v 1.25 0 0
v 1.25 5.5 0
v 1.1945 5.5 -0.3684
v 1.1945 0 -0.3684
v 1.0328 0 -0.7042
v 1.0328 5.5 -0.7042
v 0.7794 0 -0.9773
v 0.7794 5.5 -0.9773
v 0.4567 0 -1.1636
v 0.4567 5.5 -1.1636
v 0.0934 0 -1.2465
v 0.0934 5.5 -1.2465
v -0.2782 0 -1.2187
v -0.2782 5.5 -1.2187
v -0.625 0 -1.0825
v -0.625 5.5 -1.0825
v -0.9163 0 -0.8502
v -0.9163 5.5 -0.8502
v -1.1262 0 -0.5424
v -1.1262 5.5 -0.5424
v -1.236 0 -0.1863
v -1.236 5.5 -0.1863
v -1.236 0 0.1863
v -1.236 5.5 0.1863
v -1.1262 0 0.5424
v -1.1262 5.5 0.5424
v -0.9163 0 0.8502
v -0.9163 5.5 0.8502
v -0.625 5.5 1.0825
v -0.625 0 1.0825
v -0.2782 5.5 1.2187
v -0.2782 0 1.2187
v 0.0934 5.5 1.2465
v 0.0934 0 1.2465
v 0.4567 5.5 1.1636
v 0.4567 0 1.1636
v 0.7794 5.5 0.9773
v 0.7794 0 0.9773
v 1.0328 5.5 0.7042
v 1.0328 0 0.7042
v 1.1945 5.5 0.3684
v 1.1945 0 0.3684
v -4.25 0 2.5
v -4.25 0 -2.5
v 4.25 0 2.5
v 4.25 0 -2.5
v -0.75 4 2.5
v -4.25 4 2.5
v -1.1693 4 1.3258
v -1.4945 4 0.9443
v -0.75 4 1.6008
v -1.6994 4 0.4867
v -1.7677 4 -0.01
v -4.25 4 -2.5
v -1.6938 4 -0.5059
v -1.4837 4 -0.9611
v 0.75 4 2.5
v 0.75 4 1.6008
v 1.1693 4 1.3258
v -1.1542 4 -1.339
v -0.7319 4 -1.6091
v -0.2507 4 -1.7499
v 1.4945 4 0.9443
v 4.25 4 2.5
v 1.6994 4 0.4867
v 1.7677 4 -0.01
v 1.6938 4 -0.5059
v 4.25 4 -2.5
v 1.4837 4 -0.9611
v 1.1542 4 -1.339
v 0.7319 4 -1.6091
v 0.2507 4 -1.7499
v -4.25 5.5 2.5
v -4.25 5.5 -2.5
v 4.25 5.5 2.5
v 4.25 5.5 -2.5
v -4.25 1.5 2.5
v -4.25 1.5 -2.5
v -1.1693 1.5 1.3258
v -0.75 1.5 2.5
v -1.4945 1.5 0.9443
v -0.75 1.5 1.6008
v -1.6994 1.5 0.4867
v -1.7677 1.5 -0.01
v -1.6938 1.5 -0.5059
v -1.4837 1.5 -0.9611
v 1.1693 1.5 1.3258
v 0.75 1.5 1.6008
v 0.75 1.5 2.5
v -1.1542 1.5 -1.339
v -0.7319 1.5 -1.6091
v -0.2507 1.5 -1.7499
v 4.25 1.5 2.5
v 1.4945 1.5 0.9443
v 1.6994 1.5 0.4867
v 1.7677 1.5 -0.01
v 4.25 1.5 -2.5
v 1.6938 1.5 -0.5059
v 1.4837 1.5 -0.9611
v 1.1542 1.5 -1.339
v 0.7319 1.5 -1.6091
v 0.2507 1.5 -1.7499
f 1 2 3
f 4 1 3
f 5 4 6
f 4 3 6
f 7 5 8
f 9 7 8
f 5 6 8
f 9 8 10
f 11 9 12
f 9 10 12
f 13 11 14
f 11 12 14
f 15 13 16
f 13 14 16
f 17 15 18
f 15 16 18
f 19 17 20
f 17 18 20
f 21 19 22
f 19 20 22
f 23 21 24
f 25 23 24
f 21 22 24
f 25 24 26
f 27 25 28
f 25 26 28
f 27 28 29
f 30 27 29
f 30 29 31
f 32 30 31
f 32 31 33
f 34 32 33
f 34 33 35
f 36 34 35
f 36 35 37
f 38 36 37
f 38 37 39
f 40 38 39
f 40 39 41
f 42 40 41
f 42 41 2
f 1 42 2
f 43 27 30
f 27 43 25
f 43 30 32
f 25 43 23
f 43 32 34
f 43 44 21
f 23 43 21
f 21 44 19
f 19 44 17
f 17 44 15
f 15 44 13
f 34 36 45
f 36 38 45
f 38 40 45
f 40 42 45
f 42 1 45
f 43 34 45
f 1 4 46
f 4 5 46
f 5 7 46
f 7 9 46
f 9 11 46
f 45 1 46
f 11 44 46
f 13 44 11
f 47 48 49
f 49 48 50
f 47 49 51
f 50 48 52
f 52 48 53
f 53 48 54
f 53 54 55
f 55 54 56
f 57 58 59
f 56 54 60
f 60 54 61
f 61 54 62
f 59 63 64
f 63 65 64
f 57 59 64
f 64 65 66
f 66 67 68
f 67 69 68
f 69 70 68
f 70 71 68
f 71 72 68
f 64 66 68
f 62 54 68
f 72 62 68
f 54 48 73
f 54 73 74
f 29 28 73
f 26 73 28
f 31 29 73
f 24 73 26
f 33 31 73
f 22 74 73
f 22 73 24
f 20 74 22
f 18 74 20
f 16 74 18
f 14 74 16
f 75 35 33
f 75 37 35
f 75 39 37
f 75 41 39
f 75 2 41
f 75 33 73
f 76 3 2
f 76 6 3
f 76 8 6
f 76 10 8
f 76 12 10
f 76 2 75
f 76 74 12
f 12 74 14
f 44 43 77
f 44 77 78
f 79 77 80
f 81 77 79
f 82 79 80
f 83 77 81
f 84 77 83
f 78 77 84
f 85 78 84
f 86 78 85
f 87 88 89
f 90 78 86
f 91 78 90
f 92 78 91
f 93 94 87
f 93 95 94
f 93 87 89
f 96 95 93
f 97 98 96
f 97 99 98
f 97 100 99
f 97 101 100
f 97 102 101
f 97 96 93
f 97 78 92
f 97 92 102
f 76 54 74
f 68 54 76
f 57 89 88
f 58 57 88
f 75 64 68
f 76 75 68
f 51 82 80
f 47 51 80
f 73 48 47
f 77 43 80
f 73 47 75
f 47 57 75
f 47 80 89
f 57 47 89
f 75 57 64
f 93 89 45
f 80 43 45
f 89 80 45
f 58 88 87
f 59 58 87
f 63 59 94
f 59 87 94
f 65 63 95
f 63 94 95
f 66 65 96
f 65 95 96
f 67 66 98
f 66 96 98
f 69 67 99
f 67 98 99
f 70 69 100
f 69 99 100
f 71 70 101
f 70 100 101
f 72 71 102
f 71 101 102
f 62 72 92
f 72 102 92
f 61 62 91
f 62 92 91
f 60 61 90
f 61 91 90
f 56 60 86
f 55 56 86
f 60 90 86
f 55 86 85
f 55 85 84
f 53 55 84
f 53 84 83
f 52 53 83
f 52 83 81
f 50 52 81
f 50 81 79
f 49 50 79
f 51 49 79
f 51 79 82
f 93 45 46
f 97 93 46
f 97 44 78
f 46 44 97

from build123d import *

# Parameters (mm, degrees)
SKETCH1_W           = 8.5
SKETCH1_H           = 5
BOSS_EXTRUDE1_DEPTH = 1.5
BOSS_EXTRUDE2_DEPTH = 2.5
SKETCH3_W           = 8.5
SKETCH3_H           = 5
BOSS_EXTRUDE3_DEPTH = 1.5
SKETCH4_R           = 1.25
CUT_EXTRUDE1_DEPTH  = 11.5


with BuildPart() as part:
    # Sketch1 → Boss-Extrude1 (new body)
    with BuildSketch(Plane(origin=(0, 0, 0), x_dir=(1, 0, 0), z_dir=(0, 1, 0))):
        Rectangle(SKETCH1_W, SKETCH1_H)
    extrude(amount=BOSS_EXTRUDE1_DEPTH)

    # Sketch2 → Boss-Extrude2 (add)
    with BuildSketch(Plane(origin=(0, 1.5, 0), x_dir=(1, 0, 0), z_dir=(0, 1, 0))):
        with BuildLine():
            Line((-0.75, -2.5), (0.75, -2.5))
            Line((0.75, -2.5), (0.75, -1.600781056))
            ThreePointArc((0.75, -1.600781056), (0, 1.76776695), (-0.75, -1.600781056))
            Line((-0.75, -1.600781056), (-0.75, -2.5))
        make_face()
    extrude(amount=BOSS_EXTRUDE2_DEPTH)

    # Sketch3 → Boss-Extrude3 (add)
    with BuildSketch(Plane(origin=(0, 4, 0), x_dir=(1, 0, 0), z_dir=(0, 1, 0))):
        Rectangle(SKETCH3_W, SKETCH3_H)
    extrude(amount=BOSS_EXTRUDE3_DEPTH)

    # Sketch4 → Cut-Extrude1 (cut)
    with BuildSketch(Plane(origin=(0, 5.5, 0), x_dir=(1, 0, 0), z_dir=(0, 1, 0))):
        Circle(SKETCH4_R)
    extrude(amount=-CUT_EXTRUDE1_DEPTH, mode=Mode.SUBTRACT)


solid = part.part
